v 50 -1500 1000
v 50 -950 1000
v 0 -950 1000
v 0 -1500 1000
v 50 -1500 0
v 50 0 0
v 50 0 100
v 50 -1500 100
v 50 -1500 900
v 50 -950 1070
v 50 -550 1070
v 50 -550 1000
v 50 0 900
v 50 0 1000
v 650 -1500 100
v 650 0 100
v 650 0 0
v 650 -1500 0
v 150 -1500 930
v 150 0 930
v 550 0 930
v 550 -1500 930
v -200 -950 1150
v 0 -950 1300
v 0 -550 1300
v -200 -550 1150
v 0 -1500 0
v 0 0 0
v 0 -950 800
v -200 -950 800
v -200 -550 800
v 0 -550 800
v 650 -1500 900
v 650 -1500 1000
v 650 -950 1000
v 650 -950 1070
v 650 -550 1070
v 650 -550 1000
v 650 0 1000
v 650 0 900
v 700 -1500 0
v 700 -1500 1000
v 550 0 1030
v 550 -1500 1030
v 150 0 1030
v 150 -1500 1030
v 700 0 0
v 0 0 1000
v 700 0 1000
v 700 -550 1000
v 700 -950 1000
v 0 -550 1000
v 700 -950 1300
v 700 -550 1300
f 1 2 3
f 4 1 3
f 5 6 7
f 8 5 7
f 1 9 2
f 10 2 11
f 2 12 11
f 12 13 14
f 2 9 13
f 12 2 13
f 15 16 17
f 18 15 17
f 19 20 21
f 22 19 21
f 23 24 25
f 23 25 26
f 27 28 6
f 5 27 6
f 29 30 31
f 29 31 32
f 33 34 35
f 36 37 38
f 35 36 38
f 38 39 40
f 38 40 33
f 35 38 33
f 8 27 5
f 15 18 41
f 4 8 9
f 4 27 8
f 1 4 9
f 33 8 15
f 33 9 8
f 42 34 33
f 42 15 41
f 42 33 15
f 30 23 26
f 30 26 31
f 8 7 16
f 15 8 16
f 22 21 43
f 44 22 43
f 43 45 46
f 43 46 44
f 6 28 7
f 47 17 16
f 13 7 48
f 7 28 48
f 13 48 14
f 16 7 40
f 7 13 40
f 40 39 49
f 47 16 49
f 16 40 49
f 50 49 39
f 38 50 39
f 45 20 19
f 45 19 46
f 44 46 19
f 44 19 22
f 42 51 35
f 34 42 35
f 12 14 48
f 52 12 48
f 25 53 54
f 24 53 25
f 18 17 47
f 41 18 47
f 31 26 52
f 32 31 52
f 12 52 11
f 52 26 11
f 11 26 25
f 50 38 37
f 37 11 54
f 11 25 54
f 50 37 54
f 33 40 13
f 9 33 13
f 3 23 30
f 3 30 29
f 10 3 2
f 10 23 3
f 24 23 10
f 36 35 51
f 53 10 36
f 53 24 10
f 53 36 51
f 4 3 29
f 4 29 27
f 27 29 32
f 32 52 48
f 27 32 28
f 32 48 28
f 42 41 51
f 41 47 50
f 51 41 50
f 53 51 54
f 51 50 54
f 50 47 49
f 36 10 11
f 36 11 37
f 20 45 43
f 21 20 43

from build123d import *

# Parameters (mm, degrees)
F1_DEPTH = 1500
F0_W     = 400
F0_H     = 100
F4_DEPTH = 400


with BuildPart() as f1:
    # F0 (on Front) → F1 (new body)
    with BuildSketch(Plane.XZ):
        Polygon((0, 1000), (0, 0), (50, 0), (50, 100), (650, 100), (650, 0), (700, 0), (700, 1000), (650, 1000), (650, 900), (50, 900), (50, 1000), align=None)
    extrude(amount=F1_DEPTH)

    # F3 (on offset) → F4 (join)
    with BuildSketch(Plane.XZ.offset(950)):
        Polygon((0, 1000), (50, 1000), (50, 1070), (650, 1070), (650, 1000), (700, 1000), (700, 1300), (0, 1300), (-200, 1150), (-200, 800), (0, 800), align=None)
    extrude(amount=-F4_DEPTH)


with BuildPart() as f1b:
    # F0 (on Front) → F1, piece 2 (new body)
    with BuildSketch(Plane.XZ):
        with Locations((350, 980)):
            Rectangle(F0_W, F0_H)
    extrude(amount=F1_DEPTH)


solid = Compound([f1.part, f1b.part])
